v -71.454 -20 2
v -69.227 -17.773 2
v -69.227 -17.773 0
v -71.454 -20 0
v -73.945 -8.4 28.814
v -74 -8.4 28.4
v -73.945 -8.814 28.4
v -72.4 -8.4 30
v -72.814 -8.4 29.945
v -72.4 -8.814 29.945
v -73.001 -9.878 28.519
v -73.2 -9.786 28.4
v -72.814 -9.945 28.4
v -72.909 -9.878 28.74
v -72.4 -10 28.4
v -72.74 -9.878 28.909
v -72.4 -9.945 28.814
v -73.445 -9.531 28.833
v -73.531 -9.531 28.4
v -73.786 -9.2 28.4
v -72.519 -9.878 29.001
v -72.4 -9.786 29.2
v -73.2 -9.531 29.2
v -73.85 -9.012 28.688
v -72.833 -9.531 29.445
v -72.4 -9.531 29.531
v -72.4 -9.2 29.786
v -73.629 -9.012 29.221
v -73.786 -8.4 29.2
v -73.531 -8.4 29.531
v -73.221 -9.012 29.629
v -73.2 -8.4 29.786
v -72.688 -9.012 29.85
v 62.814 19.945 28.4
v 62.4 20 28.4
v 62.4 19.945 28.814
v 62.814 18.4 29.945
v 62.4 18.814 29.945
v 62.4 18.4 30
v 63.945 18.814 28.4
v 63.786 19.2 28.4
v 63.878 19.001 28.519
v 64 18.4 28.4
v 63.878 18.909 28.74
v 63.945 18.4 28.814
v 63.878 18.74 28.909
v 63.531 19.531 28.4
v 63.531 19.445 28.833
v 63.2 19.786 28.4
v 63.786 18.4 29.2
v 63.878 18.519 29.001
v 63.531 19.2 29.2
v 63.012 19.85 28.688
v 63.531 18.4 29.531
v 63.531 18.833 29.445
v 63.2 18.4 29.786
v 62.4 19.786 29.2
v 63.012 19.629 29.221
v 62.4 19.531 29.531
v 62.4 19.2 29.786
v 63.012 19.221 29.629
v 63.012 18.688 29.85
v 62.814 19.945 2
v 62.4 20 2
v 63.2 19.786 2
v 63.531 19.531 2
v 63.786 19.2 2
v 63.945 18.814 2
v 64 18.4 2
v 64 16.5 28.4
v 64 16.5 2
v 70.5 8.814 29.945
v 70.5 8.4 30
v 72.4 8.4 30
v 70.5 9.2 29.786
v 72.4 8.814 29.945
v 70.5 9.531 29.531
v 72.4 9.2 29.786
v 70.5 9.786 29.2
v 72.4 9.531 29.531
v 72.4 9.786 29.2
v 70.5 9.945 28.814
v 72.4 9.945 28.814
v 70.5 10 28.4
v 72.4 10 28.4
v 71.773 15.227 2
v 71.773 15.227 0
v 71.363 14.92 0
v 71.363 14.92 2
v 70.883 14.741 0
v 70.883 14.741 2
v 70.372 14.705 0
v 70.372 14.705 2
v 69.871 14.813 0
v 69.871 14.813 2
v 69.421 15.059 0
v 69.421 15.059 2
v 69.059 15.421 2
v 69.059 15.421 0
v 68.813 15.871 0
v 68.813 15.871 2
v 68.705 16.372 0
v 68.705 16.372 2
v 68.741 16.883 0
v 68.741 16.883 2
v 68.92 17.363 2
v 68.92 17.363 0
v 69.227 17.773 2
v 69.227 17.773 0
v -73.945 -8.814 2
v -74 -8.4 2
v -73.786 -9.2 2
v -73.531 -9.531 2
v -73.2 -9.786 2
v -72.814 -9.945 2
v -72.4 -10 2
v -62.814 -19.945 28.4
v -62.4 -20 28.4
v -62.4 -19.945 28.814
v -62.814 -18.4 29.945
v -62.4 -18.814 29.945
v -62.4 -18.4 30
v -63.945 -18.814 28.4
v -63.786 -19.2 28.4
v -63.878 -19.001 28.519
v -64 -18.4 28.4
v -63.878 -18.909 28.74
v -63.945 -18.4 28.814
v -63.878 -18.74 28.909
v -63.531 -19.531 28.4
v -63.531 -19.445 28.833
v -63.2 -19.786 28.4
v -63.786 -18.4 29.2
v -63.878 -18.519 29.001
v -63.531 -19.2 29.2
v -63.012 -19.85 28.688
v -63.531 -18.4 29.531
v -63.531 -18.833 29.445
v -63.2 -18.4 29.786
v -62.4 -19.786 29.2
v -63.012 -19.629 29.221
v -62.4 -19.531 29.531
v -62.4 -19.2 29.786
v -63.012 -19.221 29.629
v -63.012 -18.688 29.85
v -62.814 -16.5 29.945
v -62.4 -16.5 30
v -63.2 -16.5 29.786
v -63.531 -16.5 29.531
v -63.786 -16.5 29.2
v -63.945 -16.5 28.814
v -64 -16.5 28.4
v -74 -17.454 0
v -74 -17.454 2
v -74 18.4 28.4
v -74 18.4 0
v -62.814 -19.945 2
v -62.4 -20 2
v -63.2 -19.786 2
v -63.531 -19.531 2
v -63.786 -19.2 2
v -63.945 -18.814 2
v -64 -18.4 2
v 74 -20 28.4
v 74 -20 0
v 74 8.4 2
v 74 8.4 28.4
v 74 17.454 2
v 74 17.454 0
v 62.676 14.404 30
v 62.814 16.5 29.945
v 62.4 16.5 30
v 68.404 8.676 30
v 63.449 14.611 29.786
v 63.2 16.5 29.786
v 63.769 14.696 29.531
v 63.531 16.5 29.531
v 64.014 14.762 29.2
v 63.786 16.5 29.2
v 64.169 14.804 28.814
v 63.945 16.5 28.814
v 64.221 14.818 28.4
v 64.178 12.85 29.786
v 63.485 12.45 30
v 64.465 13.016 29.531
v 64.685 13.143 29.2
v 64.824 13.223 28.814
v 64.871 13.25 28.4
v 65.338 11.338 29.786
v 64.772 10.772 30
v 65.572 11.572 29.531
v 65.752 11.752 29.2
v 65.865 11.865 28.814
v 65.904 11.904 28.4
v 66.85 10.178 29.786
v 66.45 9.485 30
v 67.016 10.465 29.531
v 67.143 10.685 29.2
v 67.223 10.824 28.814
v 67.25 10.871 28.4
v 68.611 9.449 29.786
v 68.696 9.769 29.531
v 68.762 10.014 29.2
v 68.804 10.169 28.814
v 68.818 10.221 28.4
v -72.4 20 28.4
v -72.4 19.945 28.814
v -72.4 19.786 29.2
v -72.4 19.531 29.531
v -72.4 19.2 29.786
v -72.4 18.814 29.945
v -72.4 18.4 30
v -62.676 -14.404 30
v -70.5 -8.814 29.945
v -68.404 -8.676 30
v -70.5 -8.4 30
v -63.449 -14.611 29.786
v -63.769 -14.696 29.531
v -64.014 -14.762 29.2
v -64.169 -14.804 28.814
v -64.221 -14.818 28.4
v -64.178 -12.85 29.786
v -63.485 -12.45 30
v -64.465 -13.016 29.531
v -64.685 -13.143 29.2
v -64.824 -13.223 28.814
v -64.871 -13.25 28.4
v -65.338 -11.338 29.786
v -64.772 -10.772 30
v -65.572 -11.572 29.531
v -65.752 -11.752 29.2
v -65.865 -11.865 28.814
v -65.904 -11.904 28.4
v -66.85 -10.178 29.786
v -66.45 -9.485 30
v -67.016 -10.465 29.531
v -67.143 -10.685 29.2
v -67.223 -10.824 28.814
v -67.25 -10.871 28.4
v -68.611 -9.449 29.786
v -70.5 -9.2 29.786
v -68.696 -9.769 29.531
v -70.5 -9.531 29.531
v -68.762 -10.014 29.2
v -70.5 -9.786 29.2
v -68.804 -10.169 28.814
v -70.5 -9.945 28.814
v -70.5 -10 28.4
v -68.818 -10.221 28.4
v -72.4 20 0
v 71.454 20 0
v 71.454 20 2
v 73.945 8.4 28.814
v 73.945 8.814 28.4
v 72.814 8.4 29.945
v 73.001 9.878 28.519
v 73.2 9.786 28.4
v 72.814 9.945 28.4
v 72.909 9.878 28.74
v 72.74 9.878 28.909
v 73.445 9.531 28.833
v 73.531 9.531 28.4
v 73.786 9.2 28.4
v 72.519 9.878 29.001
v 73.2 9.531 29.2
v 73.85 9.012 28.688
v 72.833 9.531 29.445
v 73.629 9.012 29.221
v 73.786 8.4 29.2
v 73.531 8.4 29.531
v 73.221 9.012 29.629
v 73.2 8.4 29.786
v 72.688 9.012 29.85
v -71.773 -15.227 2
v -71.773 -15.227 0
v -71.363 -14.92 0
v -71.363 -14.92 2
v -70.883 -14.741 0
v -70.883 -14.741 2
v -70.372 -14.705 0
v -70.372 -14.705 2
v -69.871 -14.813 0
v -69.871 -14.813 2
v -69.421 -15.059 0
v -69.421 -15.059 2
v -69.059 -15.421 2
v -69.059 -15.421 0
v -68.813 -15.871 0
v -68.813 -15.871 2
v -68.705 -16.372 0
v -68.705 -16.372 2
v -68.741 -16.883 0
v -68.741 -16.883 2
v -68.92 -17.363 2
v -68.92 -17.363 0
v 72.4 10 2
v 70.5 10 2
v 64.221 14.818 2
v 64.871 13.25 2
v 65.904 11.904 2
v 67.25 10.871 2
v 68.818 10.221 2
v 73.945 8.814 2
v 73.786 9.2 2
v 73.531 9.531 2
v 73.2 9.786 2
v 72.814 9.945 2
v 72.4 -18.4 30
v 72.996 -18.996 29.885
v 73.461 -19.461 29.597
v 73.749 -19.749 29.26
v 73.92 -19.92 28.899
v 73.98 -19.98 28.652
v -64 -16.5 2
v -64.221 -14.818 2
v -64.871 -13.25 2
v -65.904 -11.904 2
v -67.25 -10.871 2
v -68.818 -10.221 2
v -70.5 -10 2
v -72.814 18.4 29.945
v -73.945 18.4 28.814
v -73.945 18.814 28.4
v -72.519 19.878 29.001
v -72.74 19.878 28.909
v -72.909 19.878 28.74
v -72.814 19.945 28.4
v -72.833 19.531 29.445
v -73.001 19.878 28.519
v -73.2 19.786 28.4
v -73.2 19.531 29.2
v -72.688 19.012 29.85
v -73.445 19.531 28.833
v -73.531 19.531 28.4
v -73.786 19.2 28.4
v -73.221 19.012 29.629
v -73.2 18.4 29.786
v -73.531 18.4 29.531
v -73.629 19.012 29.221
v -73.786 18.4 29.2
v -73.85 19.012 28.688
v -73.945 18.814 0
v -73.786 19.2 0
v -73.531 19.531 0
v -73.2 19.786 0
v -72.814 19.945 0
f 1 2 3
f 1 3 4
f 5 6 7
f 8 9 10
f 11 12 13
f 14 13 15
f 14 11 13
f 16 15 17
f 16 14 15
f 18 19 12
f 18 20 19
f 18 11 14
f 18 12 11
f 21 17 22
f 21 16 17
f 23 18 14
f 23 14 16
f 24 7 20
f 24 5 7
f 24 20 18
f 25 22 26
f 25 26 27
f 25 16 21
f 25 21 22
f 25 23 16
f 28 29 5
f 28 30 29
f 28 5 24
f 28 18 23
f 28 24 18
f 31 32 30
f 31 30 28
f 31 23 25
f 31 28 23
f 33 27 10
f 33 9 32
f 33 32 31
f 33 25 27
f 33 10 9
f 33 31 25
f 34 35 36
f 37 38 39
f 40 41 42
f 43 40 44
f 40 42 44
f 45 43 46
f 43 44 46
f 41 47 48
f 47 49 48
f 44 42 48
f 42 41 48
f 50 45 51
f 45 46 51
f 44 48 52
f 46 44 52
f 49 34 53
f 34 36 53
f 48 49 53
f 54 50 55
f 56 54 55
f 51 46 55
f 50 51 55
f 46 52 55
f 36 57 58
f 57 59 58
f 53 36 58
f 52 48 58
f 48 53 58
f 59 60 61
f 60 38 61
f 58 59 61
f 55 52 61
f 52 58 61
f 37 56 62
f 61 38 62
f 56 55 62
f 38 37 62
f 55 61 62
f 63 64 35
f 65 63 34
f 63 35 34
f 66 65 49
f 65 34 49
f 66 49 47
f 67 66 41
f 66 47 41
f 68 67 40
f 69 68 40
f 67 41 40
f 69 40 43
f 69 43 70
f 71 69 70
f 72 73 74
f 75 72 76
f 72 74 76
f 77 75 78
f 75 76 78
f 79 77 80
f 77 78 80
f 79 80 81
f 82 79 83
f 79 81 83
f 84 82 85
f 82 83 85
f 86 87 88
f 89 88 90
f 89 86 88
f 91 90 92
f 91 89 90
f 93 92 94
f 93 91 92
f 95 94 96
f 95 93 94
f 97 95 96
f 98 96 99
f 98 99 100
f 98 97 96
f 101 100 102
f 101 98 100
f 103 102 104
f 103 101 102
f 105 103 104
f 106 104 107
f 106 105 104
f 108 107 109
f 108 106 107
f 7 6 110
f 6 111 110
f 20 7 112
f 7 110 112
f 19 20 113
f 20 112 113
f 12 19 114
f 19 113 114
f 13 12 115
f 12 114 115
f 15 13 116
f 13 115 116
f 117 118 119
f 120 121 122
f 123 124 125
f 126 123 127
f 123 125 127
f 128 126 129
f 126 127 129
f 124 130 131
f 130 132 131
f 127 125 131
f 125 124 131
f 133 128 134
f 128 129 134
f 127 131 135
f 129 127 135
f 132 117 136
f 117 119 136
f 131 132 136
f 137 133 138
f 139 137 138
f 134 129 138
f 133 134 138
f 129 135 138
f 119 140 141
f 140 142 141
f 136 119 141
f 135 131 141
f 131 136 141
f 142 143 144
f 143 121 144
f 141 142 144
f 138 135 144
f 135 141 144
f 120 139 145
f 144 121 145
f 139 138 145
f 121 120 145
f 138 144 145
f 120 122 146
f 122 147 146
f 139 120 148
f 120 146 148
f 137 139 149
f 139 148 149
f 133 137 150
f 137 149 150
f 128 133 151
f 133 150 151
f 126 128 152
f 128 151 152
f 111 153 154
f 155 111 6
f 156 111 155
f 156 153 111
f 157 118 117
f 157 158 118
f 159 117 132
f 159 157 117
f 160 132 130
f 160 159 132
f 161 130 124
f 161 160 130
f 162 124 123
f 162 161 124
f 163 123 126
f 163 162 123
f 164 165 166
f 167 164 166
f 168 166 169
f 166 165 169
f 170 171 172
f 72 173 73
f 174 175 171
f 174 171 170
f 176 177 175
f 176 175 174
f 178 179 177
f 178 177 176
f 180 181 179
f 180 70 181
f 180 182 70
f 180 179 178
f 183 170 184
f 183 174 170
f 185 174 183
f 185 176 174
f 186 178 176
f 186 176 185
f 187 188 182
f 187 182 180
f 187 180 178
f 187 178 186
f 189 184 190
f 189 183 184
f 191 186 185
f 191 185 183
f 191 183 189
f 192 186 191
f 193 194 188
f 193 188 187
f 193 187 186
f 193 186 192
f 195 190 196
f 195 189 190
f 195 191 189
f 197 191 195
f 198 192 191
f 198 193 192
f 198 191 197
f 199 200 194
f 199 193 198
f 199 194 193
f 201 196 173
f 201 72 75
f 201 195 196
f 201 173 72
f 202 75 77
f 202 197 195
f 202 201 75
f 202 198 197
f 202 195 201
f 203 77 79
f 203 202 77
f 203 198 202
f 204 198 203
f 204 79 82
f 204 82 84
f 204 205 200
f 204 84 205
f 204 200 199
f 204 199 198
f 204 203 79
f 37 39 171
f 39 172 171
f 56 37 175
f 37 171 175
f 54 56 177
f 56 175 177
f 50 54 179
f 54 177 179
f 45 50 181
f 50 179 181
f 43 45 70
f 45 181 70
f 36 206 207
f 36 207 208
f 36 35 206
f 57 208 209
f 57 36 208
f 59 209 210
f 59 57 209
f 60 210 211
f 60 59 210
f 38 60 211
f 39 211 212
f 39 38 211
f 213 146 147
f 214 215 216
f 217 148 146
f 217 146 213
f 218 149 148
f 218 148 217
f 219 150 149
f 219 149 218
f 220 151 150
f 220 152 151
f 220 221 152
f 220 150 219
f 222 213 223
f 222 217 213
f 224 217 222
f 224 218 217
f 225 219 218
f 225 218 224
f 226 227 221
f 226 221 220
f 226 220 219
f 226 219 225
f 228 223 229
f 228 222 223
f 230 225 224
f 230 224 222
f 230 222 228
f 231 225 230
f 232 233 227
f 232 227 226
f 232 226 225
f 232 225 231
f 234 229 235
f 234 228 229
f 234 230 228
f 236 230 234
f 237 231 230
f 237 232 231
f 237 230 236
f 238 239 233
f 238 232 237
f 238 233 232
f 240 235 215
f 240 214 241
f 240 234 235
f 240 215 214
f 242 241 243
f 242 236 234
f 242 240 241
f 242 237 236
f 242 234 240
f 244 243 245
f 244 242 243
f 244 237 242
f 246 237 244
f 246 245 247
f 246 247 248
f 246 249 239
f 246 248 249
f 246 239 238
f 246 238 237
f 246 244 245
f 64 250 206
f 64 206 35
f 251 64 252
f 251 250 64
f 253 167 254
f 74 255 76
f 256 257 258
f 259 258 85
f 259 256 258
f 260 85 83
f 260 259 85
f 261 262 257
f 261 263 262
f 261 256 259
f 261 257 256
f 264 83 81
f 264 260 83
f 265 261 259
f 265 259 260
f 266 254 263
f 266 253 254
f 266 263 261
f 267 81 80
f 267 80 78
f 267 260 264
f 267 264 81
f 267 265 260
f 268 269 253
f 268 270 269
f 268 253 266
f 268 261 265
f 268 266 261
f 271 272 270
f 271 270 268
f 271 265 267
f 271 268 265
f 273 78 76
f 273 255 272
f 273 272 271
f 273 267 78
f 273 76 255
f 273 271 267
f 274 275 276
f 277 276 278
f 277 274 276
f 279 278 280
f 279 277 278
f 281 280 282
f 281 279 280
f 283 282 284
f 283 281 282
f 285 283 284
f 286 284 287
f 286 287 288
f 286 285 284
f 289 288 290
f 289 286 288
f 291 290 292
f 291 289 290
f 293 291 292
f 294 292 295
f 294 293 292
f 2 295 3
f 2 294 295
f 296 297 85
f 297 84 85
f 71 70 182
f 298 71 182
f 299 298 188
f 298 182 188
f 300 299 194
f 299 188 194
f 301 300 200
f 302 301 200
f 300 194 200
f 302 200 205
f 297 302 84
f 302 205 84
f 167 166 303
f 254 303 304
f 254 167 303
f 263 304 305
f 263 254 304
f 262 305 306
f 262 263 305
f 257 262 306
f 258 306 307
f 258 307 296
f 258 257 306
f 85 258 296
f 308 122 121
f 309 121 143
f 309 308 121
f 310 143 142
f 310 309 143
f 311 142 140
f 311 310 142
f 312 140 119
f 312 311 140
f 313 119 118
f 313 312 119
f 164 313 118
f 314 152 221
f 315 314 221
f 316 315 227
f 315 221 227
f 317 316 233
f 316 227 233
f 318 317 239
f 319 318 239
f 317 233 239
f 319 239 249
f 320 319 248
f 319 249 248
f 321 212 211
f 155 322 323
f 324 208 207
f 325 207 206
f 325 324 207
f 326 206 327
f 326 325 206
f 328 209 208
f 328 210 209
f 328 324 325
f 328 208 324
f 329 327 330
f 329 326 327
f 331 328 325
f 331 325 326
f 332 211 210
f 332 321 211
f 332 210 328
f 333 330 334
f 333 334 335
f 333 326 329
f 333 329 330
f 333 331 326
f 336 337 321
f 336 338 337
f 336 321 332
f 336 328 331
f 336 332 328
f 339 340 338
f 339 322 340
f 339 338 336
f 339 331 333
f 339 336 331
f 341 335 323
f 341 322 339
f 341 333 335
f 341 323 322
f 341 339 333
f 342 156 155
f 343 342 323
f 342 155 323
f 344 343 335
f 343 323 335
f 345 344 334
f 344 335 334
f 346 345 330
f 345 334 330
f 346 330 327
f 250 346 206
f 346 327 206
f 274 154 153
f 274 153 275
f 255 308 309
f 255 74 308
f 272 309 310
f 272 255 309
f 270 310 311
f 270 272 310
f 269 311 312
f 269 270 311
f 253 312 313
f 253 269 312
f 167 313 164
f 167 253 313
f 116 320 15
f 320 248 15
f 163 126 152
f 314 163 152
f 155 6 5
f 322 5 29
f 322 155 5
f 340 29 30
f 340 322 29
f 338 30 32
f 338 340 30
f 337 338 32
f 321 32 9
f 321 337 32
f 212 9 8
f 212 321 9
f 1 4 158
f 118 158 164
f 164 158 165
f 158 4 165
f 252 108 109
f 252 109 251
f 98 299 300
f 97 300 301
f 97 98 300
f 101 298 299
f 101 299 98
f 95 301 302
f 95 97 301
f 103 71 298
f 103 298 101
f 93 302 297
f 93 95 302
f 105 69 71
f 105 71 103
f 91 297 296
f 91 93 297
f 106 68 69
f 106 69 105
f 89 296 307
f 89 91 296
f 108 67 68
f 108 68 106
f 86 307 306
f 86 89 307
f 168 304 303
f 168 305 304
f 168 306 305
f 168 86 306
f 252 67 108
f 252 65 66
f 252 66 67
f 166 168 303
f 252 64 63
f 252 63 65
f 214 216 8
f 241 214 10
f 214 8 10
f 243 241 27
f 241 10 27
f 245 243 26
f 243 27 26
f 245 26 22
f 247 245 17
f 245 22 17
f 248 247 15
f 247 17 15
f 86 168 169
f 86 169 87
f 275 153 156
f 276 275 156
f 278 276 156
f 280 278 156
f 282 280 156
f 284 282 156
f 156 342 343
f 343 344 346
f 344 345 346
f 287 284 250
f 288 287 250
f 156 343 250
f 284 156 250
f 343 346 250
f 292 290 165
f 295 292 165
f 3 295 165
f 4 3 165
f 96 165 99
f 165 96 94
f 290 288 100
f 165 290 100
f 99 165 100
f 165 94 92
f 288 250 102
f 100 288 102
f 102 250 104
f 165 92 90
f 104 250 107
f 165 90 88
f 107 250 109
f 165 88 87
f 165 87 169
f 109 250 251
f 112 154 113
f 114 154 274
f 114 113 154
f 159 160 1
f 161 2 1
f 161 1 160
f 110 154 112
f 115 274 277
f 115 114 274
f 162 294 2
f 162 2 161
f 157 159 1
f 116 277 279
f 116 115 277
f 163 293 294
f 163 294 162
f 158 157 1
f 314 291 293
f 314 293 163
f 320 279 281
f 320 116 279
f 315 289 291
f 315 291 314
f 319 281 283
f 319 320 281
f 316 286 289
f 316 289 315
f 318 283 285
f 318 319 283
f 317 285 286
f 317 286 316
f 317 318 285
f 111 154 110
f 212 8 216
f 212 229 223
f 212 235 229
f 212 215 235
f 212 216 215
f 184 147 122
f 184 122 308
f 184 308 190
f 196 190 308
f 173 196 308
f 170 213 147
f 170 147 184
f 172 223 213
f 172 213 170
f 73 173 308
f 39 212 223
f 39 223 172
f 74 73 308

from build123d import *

# Parameters (mm, degrees)
SKETCH1_W           = 148
SKETCH1_H           = 40
BOSS_EXTRUDE1_DEPTH = 30
CUT_EXTRUDE1_DEPTH  = 30
CUT_EXTRUDE2_DEPTH  = 28
FILLET1_R           = 1.6


with BuildPart() as part:
    # Sketch1 → Boss-Extrude1 (new body)
    with BuildSketch(Plane.XY):
        Rectangle(SKETCH1_W, SKETCH1_H)
    extrude(amount=BOSS_EXTRUDE1_DEPTH)

    # Sketch2 → Cut-Extrude1 (cut)
    with BuildSketch(Plane.XY.offset(30)):
        with BuildLine():
            Line((69.227207794, 17.772792206), (73.727238034, 22.272822446))
            Line((73.727238034, 22.272822446), (76.272822446, 19.727238034))
            Line((76.272822446, 19.727238034), (71.772792206, 15.227207794))
            ThreePointArc((71.772792206, 15.227207794), (69.227207794, 15.227207794), (69.227207794, 17.772792206))
        make_face()
        with BuildLine():
            Line((-69.227207794, -17.772792206), (-73.727238034, -22.272822446))
            Line((-73.727238034, -22.272822446), (-76.272822446, -19.727238034))
            Line((-76.272822446, -19.727238034), (-71.772792206, -15.227207794))
            ThreePointArc((-71.772792206, -15.227207794), (-69.227207794, -15.227207794), (-69.227207794, -17.772792206))
        make_face()
    extrude(amount=-CUT_EXTRUDE1_DEPTH, mode=Mode.SUBTRACT)

    # Sketch3 → Cut-Extrude2 (cut)
    with BuildSketch(Plane.XY.offset(30)):
        with BuildLine():
            Line((64, 27.706839185), (64, 16.5))
            ThreePointArc((64, 16.5), (65.903805922, 11.903805922), (70.5, 10))
            Line((70.5, 10), (82.036431888, 10))
            Line((82.036431888, 10), (64, 27.706839185))
        make_face()
        with BuildLine():
            Line((-64, -27.706839185), (-64, -16.5))
            ThreePointArc((-64, -16.5), (-65.903805922, -11.903805922), (-70.5, -10))
            Line((-70.5, -10), (-82.036431888, -10))
            Line((-82.036431888, -10), (-64, -27.706839185))
        make_face()
    extrude(amount=-CUT_EXTRUDE2_DEPTH, mode=Mode.SUBTRACT)

    # Fillet1
    fillet1_edges = [part.edges().sort_by_distance(p)[0] for p in [
        (-74, 5, 30),
        (74, -5, 30),
        (-5, 20, 30),
        (74, 10, 16),
        (64, 20, 16),
        (72.25, 10, 30),
        (64, 18.25, 30),
        (65.903805922, 11.903805922, 30),
        (-74, 20, 15),
        (5, -20, 30),
        (-74, -10, 16),
        (-64, -20, 16),
        (-72.25, -10, 30),
        (-64, -18.25, 30),
        (-65.903805922, -11.903805922, 30),
    ]]
    fillet(fillet1_edges, radius=FILLET1_R)


solid = part.part
